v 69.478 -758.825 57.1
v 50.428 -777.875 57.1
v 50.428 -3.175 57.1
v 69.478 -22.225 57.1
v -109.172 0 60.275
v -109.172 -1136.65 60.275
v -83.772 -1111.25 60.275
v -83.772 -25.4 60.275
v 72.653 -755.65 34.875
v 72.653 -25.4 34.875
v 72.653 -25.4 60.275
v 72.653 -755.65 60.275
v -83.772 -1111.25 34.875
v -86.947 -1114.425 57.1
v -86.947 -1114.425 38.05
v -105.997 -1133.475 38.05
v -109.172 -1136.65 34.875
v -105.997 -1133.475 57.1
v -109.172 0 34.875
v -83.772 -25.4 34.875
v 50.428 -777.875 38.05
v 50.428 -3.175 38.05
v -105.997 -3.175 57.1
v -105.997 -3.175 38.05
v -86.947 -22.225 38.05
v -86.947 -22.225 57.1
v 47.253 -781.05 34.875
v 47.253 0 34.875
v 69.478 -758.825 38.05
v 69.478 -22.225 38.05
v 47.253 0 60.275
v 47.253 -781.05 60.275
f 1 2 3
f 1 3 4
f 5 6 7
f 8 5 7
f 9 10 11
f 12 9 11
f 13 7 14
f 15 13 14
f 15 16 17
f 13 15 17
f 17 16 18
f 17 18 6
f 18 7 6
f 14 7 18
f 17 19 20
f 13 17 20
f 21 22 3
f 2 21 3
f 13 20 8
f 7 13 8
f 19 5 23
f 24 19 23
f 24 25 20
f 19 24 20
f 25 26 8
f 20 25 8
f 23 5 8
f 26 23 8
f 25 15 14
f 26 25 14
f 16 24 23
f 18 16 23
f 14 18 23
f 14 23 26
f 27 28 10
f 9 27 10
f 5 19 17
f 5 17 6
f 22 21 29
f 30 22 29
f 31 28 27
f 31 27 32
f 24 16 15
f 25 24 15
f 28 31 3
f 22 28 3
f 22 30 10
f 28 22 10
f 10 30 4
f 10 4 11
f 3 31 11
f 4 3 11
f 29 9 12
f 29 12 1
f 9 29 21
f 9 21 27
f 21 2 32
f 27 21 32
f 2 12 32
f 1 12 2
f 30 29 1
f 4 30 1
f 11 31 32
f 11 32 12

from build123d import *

# Parameters (mm, degrees)
F0_W     = 25.4
F0_H     = 25.4
F0_W_2   = 19.05
F0_H_2   = 19.05
F1_DEPTH = 1136.65
F2_DEPTH = 781.05
F4_DEPTH = 25.401


with BuildPart() as f1:
    # F0 (on Front) → F1 (new body)
    with BuildSketch(Plane.XZ):
        with Locations((-96.471835, 47.574904)):
            Rectangle(F0_W, F0_H)
        with Locations((-96.471835, 47.574904)):
            Rectangle(F0_W_2, F0_H_2, mode=Mode.SUBTRACT)
    extrude(amount=F1_DEPTH)


with BuildPart() as f2:
    # F0 (on Front) → F2 (new body)
    with BuildSketch(Plane.XZ):
        with Locations((59.952876, 47.574904)):
            Rectangle(F0_W, F0_H)
        with Locations((59.952876, 47.574904)):
            Rectangle(F0_W_2, F0_H_2, mode=Mode.SUBTRACT)
    extrude(amount=F2_DEPTH)


with BuildPart() as f4_tool:
    # F3 (on face) → F4 (new body, through all)
    with BuildSketch(Plane.XY.offset(60.274904)):
        Polygon((-83.771835, -1111.25), (-109.171835, -1136.65), (-83.771835, -1136.65), align=None)
        Polygon((72.652876, -755.65), (47.252876, -781.05), (72.652876, -781.05), align=None)
        Polygon((-83.771835, 0), (-109.171835, 0), (-83.771835, -25.4), align=None)
        Polygon((72.652876, 0), (47.252876, 0), (72.652876, -25.4), align=None)
    extrude(amount=-F4_DEPTH)


with BuildPart() as f1_1:
    add(f1.part)

    # F4: cut by f4_tool
    add(f4_tool.part, mode=Mode.SUBTRACT)


with BuildPart() as f2_1:
    add(f2.part)

    # F4: cut by f4_tool
    add(f4_tool.part, mode=Mode.SUBTRACT)


solid = Compound([f1_1.part, f2_1.part])
